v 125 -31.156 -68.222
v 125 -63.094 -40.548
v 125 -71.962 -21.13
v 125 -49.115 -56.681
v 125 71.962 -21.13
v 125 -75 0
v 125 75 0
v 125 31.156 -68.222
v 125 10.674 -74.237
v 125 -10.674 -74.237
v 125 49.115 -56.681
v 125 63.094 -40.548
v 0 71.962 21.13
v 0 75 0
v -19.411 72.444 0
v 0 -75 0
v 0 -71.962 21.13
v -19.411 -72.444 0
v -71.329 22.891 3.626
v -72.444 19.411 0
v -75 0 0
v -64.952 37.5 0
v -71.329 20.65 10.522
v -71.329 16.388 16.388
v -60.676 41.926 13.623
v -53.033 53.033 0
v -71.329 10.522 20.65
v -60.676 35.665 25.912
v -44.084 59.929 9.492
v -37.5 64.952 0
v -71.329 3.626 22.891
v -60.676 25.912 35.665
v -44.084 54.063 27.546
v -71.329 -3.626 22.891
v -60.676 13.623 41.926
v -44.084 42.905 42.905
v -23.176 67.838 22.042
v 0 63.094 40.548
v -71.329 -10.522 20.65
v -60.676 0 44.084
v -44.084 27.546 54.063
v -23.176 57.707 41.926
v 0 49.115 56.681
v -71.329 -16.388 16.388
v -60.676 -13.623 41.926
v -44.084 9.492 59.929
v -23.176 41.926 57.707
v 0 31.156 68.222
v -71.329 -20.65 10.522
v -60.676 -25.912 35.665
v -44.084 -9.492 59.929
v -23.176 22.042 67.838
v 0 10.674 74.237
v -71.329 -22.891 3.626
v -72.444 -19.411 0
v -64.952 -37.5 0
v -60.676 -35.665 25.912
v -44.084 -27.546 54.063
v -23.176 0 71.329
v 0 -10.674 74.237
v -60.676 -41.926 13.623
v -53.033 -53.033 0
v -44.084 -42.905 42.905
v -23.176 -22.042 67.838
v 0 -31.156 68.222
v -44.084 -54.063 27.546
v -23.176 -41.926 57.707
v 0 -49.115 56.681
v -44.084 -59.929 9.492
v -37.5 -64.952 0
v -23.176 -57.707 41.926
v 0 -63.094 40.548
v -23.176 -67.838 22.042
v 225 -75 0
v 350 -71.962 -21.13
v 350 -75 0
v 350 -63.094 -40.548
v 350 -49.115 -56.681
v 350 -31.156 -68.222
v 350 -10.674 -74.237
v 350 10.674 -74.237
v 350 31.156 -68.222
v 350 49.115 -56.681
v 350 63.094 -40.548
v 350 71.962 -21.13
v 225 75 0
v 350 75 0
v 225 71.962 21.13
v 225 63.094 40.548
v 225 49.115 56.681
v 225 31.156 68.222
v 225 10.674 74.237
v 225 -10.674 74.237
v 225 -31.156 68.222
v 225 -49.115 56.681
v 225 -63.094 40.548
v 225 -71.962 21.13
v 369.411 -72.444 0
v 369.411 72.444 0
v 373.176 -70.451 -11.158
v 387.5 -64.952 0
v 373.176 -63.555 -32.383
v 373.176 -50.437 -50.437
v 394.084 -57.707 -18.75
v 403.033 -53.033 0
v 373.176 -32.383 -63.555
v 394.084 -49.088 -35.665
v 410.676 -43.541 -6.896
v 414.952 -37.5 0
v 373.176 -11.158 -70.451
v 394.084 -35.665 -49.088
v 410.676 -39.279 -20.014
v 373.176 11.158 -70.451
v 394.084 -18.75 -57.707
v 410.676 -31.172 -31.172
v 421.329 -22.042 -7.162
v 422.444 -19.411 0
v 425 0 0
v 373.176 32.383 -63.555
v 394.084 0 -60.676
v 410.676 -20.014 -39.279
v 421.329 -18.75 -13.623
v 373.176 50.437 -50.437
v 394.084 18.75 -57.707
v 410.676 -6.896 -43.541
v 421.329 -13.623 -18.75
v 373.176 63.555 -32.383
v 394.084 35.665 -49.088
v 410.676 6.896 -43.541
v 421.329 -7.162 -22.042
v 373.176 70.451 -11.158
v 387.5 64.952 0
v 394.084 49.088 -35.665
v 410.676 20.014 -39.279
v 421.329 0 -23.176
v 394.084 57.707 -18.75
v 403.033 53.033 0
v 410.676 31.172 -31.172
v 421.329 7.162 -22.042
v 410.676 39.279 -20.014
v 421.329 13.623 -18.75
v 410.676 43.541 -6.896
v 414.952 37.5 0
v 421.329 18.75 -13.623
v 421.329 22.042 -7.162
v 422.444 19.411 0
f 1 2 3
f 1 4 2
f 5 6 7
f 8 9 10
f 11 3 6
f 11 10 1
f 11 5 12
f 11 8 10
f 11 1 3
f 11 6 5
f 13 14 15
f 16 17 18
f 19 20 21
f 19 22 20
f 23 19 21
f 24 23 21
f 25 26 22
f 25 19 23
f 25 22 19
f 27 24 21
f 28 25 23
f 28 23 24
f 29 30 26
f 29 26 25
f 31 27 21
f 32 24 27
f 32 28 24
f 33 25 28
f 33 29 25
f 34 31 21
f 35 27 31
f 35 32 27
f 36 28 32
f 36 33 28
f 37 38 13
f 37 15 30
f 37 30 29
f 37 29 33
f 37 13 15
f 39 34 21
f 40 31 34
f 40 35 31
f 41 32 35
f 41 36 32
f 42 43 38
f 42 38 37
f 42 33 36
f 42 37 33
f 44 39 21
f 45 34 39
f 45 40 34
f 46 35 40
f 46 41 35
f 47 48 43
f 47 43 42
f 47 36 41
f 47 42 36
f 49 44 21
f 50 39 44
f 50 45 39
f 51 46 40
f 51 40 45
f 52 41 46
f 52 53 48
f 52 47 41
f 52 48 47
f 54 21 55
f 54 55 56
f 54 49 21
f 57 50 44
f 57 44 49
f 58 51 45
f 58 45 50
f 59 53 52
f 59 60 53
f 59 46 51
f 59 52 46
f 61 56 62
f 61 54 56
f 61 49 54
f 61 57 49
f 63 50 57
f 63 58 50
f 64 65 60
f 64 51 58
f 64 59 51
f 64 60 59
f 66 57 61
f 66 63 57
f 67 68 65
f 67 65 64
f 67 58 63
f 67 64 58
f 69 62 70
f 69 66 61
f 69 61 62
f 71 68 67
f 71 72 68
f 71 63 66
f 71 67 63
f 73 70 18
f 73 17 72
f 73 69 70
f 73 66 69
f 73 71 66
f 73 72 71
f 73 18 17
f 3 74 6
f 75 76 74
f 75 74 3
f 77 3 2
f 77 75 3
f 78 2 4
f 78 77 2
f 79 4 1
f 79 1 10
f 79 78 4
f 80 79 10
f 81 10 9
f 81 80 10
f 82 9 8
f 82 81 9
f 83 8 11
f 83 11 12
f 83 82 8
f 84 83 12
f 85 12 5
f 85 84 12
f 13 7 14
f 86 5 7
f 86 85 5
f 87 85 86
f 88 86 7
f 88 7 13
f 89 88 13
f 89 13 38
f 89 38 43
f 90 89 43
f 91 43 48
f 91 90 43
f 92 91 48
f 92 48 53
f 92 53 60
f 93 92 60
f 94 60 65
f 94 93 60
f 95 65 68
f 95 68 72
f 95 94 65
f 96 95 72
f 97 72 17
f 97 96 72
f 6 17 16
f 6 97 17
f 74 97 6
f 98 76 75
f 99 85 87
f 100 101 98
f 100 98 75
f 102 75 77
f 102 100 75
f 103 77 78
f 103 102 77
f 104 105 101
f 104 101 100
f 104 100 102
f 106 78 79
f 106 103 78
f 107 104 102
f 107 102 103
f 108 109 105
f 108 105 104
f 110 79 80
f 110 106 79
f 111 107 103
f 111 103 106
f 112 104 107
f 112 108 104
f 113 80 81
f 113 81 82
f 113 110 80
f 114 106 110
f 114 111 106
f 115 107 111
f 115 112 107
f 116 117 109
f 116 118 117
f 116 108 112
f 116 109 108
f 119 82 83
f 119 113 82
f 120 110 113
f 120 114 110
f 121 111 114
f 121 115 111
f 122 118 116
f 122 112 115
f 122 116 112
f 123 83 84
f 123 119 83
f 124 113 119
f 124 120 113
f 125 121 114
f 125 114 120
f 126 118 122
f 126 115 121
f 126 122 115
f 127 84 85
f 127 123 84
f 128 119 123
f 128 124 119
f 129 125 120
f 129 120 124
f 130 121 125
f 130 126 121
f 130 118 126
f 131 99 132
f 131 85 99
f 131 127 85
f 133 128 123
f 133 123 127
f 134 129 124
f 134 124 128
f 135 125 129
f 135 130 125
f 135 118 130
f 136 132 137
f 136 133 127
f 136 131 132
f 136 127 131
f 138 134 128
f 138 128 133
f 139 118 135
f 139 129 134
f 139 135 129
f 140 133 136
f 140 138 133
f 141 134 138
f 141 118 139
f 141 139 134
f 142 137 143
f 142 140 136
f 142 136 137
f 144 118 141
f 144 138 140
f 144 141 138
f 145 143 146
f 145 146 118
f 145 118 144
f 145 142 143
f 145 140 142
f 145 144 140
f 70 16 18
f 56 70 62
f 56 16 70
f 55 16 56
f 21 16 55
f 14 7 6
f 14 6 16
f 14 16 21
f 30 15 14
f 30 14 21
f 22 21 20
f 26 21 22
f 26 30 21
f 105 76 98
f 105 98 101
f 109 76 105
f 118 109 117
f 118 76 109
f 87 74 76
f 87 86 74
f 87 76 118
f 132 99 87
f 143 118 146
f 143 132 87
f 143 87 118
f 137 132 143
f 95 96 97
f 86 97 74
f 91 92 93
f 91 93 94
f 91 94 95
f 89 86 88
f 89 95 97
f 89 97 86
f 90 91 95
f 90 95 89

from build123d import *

# Parameters (mm, degrees)
REVOLVE1_ANGLE = 180
REVOLVE2_ANGLE = 180


with BuildPart() as part:
    # Sketch1 → Revolve1 (revolve)
    with BuildSketch(Plane.XY):
        with BuildLine():
            Line((0, 75), (225, 75))
            Line((225, 75), (225, 0))
            Line((225, 0), (-75, 0))
            ThreePointArc((-75, 0), (-53.033008589, 53.033008589), (0, 75))
        make_face()
    revolve(axis=Axis((-97.796083429, 0, 0), (1, 0, 0)), revolution_arc=REVOLVE1_ANGLE)

    # Sketch1<4> → Revolve2 (revolve)
    with BuildSketch(Plane.XY):
        with BuildLine():
            Line((425, 0), (225, 0))
            Line((225, 0), (125, 0))
            Line((125, 0), (125, -75))
            Line((125, -75), (350, -75))
            ThreePointArc((350, -75), (403.033008589, -53.033008589), (425, 0))
        make_face()
    revolve(axis=Axis((-97.796083429, 0, 0), (1, 0, 0)), revolution_arc=REVOLVE2_ANGLE)


solid = part.part
